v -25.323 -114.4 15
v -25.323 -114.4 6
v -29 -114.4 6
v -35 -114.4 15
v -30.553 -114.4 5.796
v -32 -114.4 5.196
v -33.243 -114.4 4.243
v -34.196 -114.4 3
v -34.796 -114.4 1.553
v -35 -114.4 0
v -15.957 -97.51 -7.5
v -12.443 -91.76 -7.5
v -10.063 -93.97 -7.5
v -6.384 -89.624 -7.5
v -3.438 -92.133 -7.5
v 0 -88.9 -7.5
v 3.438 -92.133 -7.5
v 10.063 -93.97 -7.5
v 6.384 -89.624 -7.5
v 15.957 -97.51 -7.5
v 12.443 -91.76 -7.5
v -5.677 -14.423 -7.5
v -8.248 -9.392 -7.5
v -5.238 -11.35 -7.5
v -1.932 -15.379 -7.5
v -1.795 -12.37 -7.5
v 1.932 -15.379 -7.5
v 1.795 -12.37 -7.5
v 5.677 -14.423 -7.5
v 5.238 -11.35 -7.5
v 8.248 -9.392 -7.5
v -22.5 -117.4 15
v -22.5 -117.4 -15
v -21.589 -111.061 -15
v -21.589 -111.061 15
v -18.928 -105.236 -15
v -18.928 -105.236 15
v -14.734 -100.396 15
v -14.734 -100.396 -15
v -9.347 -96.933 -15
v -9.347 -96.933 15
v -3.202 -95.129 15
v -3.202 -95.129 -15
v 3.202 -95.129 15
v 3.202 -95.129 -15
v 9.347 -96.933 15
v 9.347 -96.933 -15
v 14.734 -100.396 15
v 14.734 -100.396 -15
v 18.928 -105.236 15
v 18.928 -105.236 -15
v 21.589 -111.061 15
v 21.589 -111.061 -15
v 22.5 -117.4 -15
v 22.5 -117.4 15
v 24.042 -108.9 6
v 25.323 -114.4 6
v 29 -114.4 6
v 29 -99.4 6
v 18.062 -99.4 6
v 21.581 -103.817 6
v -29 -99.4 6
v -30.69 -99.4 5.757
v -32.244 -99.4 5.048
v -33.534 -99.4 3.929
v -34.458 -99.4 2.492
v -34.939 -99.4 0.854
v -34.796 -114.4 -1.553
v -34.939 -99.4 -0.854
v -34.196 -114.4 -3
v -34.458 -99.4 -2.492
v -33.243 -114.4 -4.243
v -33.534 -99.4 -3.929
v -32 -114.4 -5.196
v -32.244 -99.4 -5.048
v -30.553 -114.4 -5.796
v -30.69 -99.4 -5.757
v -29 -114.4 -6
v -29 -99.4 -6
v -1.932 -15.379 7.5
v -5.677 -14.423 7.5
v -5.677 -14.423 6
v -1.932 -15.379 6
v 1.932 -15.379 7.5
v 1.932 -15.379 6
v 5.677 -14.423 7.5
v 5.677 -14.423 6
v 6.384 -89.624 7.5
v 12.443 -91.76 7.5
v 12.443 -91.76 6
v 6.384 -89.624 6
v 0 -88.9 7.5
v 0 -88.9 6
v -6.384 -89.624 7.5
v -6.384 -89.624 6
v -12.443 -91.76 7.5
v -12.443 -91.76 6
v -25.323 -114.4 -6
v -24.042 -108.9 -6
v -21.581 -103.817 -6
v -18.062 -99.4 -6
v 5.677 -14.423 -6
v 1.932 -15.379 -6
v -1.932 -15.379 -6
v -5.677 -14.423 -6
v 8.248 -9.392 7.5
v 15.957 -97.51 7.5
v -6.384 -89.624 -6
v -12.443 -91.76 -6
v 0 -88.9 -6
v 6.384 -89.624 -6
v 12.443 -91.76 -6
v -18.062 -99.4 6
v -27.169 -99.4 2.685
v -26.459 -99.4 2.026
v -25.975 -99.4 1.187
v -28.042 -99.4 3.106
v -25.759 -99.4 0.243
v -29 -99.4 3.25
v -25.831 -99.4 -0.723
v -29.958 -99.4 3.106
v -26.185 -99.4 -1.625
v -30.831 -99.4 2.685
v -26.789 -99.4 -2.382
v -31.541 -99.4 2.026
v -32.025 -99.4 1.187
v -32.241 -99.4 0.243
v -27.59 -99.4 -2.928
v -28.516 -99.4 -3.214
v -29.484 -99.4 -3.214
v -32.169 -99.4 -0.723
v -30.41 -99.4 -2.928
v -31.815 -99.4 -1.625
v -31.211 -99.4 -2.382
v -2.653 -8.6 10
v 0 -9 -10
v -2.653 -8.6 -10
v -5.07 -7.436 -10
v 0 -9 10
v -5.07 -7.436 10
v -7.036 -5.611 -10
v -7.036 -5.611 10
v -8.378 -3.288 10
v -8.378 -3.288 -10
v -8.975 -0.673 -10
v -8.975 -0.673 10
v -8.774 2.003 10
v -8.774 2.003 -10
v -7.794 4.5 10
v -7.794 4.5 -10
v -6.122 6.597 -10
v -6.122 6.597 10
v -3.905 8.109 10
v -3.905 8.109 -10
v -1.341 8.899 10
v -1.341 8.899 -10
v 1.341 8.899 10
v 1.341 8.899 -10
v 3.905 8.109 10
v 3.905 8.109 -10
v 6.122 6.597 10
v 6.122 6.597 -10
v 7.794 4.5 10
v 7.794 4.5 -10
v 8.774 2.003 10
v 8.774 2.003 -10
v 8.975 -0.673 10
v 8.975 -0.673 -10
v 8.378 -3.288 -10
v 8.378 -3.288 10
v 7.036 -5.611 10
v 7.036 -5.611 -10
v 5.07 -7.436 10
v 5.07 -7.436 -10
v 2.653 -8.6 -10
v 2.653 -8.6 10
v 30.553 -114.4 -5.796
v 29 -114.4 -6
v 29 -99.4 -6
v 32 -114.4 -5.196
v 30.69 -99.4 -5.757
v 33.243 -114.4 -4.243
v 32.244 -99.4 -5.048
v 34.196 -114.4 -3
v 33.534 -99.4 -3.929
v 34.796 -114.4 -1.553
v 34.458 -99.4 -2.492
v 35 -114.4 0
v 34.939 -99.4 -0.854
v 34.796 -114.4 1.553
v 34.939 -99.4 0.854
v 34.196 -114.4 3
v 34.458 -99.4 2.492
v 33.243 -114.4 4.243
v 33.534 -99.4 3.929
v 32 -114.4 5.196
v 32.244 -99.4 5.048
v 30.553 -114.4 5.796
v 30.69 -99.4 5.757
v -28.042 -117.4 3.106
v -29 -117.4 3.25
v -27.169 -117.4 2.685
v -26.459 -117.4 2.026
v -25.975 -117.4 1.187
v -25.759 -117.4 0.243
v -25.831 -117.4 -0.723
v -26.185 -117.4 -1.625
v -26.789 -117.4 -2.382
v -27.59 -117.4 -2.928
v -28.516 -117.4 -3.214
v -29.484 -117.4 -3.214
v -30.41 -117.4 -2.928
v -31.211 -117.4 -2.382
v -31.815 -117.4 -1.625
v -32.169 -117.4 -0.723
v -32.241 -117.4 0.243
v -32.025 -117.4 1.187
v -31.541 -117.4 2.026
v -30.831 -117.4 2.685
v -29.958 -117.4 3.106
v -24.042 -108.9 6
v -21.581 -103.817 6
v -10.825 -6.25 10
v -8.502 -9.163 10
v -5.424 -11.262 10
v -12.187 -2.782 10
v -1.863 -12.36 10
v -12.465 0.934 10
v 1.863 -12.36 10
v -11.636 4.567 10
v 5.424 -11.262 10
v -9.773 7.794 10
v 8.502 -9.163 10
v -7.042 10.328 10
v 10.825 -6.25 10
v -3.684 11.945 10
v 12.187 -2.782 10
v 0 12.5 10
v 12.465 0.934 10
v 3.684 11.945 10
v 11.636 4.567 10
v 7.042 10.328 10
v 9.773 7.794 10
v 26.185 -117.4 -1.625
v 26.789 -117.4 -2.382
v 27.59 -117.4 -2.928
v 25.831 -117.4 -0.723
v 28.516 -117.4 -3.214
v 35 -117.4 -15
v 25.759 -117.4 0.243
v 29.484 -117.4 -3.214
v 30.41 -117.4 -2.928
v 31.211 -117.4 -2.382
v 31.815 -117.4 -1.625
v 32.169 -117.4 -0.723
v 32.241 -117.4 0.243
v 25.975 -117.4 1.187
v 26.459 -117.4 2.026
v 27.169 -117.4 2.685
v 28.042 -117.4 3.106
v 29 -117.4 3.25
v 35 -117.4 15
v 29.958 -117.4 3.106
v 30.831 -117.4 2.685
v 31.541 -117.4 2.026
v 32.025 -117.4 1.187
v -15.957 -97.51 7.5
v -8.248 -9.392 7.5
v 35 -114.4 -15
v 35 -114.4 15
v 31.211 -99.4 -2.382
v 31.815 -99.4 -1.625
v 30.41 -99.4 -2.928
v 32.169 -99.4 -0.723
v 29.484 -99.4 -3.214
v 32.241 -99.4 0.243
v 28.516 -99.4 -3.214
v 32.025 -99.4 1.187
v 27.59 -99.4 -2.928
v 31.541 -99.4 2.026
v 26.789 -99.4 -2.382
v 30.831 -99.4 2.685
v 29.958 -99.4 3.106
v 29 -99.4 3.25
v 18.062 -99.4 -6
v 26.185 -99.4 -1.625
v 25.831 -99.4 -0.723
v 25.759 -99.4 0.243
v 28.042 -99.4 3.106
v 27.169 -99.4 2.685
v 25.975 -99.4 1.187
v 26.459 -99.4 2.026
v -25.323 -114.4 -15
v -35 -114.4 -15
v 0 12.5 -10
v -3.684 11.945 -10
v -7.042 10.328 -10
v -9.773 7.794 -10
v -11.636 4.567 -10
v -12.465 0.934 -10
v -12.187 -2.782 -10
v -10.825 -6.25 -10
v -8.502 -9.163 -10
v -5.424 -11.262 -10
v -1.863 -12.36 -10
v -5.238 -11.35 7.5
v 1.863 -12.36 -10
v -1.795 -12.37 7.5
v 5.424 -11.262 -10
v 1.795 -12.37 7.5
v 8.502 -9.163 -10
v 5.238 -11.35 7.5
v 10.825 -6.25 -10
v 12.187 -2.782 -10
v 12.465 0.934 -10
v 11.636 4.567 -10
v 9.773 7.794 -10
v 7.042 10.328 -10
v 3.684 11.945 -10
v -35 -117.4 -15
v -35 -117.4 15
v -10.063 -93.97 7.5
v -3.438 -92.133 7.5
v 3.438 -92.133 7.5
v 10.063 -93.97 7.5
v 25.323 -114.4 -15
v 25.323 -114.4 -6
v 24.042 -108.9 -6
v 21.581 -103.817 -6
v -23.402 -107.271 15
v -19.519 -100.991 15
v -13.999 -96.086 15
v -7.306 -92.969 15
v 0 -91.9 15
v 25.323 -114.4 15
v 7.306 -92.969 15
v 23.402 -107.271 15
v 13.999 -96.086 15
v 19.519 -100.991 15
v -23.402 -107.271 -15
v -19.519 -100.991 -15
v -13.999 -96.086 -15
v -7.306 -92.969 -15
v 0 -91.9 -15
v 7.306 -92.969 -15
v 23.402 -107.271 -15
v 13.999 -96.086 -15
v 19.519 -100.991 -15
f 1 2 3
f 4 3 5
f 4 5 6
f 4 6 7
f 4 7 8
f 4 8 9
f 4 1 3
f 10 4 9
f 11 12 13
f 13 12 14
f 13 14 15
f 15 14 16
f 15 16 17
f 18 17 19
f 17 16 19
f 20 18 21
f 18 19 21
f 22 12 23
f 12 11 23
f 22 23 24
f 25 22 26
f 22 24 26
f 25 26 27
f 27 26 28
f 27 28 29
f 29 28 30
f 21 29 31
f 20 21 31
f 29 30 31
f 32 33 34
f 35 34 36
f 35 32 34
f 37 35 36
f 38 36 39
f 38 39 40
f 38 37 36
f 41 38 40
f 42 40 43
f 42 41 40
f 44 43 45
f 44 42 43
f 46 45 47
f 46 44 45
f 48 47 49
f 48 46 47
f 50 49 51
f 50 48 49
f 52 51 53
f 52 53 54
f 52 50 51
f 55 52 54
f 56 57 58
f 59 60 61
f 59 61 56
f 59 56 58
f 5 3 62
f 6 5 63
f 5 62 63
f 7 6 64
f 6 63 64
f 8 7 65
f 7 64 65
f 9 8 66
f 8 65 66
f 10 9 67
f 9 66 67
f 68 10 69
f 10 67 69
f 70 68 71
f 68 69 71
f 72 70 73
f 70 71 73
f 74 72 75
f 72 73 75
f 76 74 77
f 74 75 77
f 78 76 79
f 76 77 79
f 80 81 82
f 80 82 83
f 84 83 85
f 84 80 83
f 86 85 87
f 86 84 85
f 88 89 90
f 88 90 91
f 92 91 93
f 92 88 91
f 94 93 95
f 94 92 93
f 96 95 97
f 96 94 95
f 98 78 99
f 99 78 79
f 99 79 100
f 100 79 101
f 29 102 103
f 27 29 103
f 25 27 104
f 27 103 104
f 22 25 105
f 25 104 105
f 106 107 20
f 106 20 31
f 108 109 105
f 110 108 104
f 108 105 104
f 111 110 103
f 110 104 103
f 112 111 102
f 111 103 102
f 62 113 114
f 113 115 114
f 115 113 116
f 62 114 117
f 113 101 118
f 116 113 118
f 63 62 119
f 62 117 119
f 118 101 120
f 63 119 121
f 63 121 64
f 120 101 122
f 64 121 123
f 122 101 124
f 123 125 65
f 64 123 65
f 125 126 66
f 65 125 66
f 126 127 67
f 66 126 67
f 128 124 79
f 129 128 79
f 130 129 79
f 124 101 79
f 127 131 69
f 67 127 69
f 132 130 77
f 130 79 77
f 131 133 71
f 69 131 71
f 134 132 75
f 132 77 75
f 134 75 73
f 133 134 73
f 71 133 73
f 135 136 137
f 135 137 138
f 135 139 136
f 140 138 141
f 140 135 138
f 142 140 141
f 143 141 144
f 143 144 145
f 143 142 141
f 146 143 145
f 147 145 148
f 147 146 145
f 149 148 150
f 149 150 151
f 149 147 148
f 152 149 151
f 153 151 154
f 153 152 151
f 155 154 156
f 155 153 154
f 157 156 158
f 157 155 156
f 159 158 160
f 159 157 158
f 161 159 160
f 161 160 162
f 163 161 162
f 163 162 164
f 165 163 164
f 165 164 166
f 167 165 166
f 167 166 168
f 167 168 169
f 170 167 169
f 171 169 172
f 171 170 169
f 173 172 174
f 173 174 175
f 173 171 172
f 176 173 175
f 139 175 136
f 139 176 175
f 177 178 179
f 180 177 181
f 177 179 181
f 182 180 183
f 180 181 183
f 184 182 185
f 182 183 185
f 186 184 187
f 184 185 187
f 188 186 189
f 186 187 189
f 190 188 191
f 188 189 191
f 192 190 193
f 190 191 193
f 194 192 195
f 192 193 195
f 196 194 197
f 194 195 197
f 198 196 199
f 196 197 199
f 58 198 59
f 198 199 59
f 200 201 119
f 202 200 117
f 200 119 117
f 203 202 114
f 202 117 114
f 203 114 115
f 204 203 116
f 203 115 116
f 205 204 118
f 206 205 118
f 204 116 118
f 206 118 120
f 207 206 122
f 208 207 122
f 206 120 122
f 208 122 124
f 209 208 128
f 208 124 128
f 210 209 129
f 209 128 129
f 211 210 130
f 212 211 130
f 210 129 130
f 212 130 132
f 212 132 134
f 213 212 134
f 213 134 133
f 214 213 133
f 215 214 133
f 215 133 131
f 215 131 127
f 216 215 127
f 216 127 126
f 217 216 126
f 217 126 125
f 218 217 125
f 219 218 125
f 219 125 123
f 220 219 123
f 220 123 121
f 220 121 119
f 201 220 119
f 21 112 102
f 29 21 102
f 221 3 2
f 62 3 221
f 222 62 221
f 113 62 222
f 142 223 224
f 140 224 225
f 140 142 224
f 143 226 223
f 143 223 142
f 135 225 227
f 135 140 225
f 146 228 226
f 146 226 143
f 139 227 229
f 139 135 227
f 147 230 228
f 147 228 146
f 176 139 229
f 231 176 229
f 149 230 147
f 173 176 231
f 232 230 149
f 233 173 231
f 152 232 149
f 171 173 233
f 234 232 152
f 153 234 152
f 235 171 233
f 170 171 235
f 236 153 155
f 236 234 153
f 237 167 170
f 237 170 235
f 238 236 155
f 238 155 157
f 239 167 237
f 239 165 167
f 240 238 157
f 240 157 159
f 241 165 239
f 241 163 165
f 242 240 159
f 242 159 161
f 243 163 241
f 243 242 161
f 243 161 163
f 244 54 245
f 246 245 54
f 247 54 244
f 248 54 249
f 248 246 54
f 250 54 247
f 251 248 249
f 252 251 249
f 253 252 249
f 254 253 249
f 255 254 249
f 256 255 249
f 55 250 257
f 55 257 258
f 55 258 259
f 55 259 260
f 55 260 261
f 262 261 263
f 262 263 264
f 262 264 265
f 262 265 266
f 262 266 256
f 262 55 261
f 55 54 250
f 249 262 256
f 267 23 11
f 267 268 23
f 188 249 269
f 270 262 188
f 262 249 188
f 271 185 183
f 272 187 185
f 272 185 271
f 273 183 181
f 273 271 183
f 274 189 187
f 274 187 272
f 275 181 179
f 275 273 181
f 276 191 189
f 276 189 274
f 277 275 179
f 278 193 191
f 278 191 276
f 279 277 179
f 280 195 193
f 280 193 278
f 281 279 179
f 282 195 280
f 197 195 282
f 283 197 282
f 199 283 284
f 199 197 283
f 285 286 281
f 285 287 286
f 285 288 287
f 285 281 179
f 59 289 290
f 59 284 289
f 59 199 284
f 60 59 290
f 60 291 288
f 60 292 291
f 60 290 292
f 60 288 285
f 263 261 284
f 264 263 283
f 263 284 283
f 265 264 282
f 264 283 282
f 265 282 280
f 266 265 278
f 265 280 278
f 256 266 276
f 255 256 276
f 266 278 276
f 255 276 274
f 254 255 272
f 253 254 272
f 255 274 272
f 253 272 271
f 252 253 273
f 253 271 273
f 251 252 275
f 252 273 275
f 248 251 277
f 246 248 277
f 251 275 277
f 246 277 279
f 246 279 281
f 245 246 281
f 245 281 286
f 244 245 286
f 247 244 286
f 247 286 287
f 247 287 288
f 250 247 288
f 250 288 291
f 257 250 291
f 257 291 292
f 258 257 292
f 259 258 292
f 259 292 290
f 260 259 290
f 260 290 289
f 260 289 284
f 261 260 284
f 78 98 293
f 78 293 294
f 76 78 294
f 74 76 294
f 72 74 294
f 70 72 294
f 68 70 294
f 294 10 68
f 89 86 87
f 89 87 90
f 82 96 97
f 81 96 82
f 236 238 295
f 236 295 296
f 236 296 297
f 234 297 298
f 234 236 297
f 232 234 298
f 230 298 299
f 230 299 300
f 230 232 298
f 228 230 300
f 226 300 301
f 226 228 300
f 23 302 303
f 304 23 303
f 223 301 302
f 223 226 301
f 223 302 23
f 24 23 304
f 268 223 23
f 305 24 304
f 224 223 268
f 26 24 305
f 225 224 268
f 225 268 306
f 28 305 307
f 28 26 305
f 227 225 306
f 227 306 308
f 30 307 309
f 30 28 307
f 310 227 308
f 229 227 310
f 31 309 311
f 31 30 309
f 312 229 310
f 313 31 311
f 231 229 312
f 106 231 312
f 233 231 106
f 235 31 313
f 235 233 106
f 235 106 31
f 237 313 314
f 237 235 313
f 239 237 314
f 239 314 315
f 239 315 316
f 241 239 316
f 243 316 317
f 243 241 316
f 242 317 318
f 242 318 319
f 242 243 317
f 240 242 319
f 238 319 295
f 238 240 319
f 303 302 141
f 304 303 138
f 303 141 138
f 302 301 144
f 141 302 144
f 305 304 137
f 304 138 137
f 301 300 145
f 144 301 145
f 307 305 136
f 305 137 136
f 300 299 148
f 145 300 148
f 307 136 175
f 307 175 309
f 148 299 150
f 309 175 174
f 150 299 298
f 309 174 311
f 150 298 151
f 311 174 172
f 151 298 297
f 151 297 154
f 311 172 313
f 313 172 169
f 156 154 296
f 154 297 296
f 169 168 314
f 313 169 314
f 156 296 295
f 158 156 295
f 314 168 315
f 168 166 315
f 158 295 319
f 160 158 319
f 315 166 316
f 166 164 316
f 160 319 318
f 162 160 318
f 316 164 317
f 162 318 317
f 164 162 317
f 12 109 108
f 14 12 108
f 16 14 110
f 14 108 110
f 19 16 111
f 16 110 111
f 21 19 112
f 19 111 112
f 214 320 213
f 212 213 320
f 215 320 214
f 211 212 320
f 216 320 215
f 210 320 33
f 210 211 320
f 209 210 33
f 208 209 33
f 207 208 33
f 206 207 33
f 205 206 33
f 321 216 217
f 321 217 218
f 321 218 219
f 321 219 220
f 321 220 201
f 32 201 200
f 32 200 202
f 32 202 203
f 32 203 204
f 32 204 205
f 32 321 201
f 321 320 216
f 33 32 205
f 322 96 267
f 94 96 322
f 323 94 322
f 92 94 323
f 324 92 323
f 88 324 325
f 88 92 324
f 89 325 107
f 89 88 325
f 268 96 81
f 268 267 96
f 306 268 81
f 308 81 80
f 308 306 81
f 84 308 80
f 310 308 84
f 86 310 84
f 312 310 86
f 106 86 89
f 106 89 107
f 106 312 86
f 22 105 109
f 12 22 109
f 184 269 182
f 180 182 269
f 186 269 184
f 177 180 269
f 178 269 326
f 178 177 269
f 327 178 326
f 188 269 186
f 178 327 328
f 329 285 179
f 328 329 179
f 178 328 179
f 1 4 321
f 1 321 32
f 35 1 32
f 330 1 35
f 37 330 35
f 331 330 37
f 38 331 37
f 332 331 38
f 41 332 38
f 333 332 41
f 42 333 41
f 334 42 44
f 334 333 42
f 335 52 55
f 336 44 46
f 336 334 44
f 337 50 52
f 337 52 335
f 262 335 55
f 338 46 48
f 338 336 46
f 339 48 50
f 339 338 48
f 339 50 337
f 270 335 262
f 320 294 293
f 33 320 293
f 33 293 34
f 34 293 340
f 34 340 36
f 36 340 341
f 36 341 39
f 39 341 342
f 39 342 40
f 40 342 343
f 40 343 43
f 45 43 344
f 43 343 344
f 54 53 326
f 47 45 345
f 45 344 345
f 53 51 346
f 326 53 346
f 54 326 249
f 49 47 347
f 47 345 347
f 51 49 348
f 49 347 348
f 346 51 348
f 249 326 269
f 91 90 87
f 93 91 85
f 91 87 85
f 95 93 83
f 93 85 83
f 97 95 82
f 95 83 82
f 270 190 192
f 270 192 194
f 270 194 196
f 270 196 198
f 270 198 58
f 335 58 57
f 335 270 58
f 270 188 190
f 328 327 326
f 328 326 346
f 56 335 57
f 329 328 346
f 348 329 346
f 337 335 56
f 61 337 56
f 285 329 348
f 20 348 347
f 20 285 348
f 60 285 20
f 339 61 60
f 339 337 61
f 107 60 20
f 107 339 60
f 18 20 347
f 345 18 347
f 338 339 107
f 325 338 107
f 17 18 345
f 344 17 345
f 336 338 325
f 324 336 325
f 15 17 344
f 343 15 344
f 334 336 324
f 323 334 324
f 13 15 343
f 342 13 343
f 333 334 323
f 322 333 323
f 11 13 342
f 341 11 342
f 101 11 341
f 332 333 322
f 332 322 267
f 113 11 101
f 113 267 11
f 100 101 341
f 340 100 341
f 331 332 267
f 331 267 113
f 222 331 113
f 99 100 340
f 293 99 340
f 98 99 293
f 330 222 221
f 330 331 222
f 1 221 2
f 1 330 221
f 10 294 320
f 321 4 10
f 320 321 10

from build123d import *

# Parameters (mm, degrees)
BOSS_EXTRUDE3_DEPTH = 15
BOSS_EXTRUDE4_DEPTH = 6
BOSS_EXTRUDE5_DEPTH = 7.5
SKETCH1_8_R         = 12.5
SKETCH1_8_R_2       = 9
BOSS_EXTRUDE6_DEPTH = 10
CUT_EXTRUDE2_DEPTH  = 15
SKETCH3_7_R         = 3.25
CUT_EXTRUDE3_DEPTH  = 119.201565133
CUT_EXTRUDE5_DEPTH  = 1.5
CUT_EXTRUDE6_START  = -1.5
CUT_EXTRUDE6_DEPTH  = 1.5


with BuildPart() as part:
    # Sketch1 → Boss-Extrude3 (new, symmetric)
    with BuildSketch(Plane.XY):
        with BuildLine():
            Line((-25.322914524, -114.4), (-35, -114.4))
            Line((-35, -114.4), (-35, -117.4))
            Line((-35, -117.4), (-22.5, -117.4))
            ThreePointArc((-22.5, -117.4), (0, -94.9), (22.5, -117.4))
            Line((22.5, -117.4), (35, -117.4))
            Line((35, -117.4), (35, -114.4))
            Line((35, -114.4), (25.322914524, -114.4))
            ThreePointArc((25.322914524, -114.4), (0, -91.9), (-25.322914524, -114.4))
        make_face()
    extrude(amount=BOSS_EXTRUDE3_DEPTH, both=True)

    # Sketch1<6> → Boss-Extrude4 (add, symmetric)
    with BuildSketch(Plane.XY):
        with BuildLine():
            ThreePointArc((-25.322914524, -114.4), (-22.95258597, -106.290148637), (-18.062391868, -99.4))
            Line((-18.062391868, -99.4), (-35, -99.4))
            Line((-35, -99.4), (-35, -114.4))
            Line((-35, -114.4), (-25.322914524, -114.4))
        make_face()
        with BuildLine():
            ThreePointArc((18.062391868, -99.4), (22.95258597, -106.290148637), (25.322914524, -114.4))
            Line((25.322914524, -114.4), (35, -114.4))
            Line((35, -114.4), (35, -99.4))
            Line((35, -99.4), (18.062391868, -99.4))
        make_face()
    extrude(amount=BOSS_EXTRUDE4_DEPTH, both=True)

    # Sketch1<7> → Boss-Extrude5 (add, symmetric)
    with BuildSketch(Plane.XY):
        with BuildLine():
            Line((-8.248094724, -9.392493462), (-15.957377604, -97.51))
            ThreePointArc((-15.957377604, -97.51), (0, -91.9), (15.957377604, -97.51))
            Line((15.957377604, -97.51), (8.248094724, -9.392493462))
            ThreePointArc((8.248094724, -9.392493462), (0, -12.5), (-8.248094724, -9.392493462))
        make_face()
    extrude(amount=BOSS_EXTRUDE5_DEPTH, both=True)

    # Sketch1<8> → Boss-Extrude6 (add, symmetric)
    with BuildSketch(Plane.XY):
        Circle(SKETCH1_8_R)
        Circle(SKETCH1_8_R_2, mode=Mode.SUBTRACT)
    extrude(amount=BOSS_EXTRUDE6_DEPTH, both=True)

    # Sketch3 → Cut-Extrude2 (cut)
    with BuildSketch(Plane(origin=(0, -99.4, 0), x_dir=(1, 0, 0), z_dir=(0, 1, 0))):
        with BuildLine():
            Line((35, 6), (29, 6))
            ThreePointArc((29, 6), (33.242640687, 4.242640687), (35, 0))
            Line((35, 0), (35, 6))
        make_face()
        with BuildLine():
            ThreePointArc((35, 0), (33.242640687, -4.242640687), (29, -6))
            Line((29, -6), (35, -6))
            Line((35, -6), (35, 0))
        make_face()
        with BuildLine():
            Line((-35, 0), (-35, -6))
            Line((-35, -6), (-29, -6))
            ThreePointArc((-29, -6), (-33.242640687, -4.242640687), (-35, 0))
        make_face()
        with BuildLine():
            Line((-35, 6), (-35, 0))
            ThreePointArc((-35, 0), (-33.242640687, 4.242640687), (-29, 6))
            Line((-29, 6), (-35, 6))
        make_face()
    extrude(amount=-CUT_EXTRUDE2_DEPTH, mode=Mode.SUBTRACT)

    # Sketch3<7> → Cut-Extrude3 (cut, through all)
    with BuildSketch(Plane(origin=(0, -99.4, 0), x_dir=(1, 0, 0), z_dir=(0, 1, 0))):
        with Locations((29, 0)):
            Circle(SKETCH3_7_R)
        with Locations((-29, 0)):
            Circle(SKETCH3_7_R)
    extrude(amount=-CUT_EXTRUDE3_DEPTH, mode=Mode.SUBTRACT)

    # Sketch4 → Cut-Extrude5 (cut)
    with BuildSketch(Plane.XY.offset(7.5)):
        with BuildLine():
            Line((5.676752222, -14.423053914), (12.442830342, -91.759680714))
            ThreePointArc((12.442830342, -91.759680714), (0, -88.9), (-12.442830342, -91.759680714))
            Line((-12.442830342, -91.759680714), (-5.676752222, -14.423053914))
            ThreePointArc((-5.676752222, -14.423053914), (0, -15.5), (5.676752222, -14.423053914))
        make_face()
    extrude(amount=-CUT_EXTRUDE5_DEPTH, mode=Mode.SUBTRACT)

    # Sketch6 → Cut-Extrude6 (cut)
    with BuildSketch(Plane(origin=(0, 0, -7.5), x_dir=(-1, 0, 0), z_dir=(0, 0, -1)).offset(CUT_EXTRUDE6_START)):
        with BuildLine():
            Line((5.676752222, -14.423053914), (12.442830342, -91.759680714))
            ThreePointArc((12.442830342, -91.759680714), (0, -88.9), (-12.442830342, -91.759680714))
            Line((-12.442830342, -91.759680714), (-5.676752222, -14.423053914))
            ThreePointArc((-5.676752222, -14.423053914), (0, -15.5), (5.676752222, -14.423053914))
        make_face()
    extrude(amount=CUT_EXTRUDE6_DEPTH, mode=Mode.SUBTRACT)


solid = part.part
